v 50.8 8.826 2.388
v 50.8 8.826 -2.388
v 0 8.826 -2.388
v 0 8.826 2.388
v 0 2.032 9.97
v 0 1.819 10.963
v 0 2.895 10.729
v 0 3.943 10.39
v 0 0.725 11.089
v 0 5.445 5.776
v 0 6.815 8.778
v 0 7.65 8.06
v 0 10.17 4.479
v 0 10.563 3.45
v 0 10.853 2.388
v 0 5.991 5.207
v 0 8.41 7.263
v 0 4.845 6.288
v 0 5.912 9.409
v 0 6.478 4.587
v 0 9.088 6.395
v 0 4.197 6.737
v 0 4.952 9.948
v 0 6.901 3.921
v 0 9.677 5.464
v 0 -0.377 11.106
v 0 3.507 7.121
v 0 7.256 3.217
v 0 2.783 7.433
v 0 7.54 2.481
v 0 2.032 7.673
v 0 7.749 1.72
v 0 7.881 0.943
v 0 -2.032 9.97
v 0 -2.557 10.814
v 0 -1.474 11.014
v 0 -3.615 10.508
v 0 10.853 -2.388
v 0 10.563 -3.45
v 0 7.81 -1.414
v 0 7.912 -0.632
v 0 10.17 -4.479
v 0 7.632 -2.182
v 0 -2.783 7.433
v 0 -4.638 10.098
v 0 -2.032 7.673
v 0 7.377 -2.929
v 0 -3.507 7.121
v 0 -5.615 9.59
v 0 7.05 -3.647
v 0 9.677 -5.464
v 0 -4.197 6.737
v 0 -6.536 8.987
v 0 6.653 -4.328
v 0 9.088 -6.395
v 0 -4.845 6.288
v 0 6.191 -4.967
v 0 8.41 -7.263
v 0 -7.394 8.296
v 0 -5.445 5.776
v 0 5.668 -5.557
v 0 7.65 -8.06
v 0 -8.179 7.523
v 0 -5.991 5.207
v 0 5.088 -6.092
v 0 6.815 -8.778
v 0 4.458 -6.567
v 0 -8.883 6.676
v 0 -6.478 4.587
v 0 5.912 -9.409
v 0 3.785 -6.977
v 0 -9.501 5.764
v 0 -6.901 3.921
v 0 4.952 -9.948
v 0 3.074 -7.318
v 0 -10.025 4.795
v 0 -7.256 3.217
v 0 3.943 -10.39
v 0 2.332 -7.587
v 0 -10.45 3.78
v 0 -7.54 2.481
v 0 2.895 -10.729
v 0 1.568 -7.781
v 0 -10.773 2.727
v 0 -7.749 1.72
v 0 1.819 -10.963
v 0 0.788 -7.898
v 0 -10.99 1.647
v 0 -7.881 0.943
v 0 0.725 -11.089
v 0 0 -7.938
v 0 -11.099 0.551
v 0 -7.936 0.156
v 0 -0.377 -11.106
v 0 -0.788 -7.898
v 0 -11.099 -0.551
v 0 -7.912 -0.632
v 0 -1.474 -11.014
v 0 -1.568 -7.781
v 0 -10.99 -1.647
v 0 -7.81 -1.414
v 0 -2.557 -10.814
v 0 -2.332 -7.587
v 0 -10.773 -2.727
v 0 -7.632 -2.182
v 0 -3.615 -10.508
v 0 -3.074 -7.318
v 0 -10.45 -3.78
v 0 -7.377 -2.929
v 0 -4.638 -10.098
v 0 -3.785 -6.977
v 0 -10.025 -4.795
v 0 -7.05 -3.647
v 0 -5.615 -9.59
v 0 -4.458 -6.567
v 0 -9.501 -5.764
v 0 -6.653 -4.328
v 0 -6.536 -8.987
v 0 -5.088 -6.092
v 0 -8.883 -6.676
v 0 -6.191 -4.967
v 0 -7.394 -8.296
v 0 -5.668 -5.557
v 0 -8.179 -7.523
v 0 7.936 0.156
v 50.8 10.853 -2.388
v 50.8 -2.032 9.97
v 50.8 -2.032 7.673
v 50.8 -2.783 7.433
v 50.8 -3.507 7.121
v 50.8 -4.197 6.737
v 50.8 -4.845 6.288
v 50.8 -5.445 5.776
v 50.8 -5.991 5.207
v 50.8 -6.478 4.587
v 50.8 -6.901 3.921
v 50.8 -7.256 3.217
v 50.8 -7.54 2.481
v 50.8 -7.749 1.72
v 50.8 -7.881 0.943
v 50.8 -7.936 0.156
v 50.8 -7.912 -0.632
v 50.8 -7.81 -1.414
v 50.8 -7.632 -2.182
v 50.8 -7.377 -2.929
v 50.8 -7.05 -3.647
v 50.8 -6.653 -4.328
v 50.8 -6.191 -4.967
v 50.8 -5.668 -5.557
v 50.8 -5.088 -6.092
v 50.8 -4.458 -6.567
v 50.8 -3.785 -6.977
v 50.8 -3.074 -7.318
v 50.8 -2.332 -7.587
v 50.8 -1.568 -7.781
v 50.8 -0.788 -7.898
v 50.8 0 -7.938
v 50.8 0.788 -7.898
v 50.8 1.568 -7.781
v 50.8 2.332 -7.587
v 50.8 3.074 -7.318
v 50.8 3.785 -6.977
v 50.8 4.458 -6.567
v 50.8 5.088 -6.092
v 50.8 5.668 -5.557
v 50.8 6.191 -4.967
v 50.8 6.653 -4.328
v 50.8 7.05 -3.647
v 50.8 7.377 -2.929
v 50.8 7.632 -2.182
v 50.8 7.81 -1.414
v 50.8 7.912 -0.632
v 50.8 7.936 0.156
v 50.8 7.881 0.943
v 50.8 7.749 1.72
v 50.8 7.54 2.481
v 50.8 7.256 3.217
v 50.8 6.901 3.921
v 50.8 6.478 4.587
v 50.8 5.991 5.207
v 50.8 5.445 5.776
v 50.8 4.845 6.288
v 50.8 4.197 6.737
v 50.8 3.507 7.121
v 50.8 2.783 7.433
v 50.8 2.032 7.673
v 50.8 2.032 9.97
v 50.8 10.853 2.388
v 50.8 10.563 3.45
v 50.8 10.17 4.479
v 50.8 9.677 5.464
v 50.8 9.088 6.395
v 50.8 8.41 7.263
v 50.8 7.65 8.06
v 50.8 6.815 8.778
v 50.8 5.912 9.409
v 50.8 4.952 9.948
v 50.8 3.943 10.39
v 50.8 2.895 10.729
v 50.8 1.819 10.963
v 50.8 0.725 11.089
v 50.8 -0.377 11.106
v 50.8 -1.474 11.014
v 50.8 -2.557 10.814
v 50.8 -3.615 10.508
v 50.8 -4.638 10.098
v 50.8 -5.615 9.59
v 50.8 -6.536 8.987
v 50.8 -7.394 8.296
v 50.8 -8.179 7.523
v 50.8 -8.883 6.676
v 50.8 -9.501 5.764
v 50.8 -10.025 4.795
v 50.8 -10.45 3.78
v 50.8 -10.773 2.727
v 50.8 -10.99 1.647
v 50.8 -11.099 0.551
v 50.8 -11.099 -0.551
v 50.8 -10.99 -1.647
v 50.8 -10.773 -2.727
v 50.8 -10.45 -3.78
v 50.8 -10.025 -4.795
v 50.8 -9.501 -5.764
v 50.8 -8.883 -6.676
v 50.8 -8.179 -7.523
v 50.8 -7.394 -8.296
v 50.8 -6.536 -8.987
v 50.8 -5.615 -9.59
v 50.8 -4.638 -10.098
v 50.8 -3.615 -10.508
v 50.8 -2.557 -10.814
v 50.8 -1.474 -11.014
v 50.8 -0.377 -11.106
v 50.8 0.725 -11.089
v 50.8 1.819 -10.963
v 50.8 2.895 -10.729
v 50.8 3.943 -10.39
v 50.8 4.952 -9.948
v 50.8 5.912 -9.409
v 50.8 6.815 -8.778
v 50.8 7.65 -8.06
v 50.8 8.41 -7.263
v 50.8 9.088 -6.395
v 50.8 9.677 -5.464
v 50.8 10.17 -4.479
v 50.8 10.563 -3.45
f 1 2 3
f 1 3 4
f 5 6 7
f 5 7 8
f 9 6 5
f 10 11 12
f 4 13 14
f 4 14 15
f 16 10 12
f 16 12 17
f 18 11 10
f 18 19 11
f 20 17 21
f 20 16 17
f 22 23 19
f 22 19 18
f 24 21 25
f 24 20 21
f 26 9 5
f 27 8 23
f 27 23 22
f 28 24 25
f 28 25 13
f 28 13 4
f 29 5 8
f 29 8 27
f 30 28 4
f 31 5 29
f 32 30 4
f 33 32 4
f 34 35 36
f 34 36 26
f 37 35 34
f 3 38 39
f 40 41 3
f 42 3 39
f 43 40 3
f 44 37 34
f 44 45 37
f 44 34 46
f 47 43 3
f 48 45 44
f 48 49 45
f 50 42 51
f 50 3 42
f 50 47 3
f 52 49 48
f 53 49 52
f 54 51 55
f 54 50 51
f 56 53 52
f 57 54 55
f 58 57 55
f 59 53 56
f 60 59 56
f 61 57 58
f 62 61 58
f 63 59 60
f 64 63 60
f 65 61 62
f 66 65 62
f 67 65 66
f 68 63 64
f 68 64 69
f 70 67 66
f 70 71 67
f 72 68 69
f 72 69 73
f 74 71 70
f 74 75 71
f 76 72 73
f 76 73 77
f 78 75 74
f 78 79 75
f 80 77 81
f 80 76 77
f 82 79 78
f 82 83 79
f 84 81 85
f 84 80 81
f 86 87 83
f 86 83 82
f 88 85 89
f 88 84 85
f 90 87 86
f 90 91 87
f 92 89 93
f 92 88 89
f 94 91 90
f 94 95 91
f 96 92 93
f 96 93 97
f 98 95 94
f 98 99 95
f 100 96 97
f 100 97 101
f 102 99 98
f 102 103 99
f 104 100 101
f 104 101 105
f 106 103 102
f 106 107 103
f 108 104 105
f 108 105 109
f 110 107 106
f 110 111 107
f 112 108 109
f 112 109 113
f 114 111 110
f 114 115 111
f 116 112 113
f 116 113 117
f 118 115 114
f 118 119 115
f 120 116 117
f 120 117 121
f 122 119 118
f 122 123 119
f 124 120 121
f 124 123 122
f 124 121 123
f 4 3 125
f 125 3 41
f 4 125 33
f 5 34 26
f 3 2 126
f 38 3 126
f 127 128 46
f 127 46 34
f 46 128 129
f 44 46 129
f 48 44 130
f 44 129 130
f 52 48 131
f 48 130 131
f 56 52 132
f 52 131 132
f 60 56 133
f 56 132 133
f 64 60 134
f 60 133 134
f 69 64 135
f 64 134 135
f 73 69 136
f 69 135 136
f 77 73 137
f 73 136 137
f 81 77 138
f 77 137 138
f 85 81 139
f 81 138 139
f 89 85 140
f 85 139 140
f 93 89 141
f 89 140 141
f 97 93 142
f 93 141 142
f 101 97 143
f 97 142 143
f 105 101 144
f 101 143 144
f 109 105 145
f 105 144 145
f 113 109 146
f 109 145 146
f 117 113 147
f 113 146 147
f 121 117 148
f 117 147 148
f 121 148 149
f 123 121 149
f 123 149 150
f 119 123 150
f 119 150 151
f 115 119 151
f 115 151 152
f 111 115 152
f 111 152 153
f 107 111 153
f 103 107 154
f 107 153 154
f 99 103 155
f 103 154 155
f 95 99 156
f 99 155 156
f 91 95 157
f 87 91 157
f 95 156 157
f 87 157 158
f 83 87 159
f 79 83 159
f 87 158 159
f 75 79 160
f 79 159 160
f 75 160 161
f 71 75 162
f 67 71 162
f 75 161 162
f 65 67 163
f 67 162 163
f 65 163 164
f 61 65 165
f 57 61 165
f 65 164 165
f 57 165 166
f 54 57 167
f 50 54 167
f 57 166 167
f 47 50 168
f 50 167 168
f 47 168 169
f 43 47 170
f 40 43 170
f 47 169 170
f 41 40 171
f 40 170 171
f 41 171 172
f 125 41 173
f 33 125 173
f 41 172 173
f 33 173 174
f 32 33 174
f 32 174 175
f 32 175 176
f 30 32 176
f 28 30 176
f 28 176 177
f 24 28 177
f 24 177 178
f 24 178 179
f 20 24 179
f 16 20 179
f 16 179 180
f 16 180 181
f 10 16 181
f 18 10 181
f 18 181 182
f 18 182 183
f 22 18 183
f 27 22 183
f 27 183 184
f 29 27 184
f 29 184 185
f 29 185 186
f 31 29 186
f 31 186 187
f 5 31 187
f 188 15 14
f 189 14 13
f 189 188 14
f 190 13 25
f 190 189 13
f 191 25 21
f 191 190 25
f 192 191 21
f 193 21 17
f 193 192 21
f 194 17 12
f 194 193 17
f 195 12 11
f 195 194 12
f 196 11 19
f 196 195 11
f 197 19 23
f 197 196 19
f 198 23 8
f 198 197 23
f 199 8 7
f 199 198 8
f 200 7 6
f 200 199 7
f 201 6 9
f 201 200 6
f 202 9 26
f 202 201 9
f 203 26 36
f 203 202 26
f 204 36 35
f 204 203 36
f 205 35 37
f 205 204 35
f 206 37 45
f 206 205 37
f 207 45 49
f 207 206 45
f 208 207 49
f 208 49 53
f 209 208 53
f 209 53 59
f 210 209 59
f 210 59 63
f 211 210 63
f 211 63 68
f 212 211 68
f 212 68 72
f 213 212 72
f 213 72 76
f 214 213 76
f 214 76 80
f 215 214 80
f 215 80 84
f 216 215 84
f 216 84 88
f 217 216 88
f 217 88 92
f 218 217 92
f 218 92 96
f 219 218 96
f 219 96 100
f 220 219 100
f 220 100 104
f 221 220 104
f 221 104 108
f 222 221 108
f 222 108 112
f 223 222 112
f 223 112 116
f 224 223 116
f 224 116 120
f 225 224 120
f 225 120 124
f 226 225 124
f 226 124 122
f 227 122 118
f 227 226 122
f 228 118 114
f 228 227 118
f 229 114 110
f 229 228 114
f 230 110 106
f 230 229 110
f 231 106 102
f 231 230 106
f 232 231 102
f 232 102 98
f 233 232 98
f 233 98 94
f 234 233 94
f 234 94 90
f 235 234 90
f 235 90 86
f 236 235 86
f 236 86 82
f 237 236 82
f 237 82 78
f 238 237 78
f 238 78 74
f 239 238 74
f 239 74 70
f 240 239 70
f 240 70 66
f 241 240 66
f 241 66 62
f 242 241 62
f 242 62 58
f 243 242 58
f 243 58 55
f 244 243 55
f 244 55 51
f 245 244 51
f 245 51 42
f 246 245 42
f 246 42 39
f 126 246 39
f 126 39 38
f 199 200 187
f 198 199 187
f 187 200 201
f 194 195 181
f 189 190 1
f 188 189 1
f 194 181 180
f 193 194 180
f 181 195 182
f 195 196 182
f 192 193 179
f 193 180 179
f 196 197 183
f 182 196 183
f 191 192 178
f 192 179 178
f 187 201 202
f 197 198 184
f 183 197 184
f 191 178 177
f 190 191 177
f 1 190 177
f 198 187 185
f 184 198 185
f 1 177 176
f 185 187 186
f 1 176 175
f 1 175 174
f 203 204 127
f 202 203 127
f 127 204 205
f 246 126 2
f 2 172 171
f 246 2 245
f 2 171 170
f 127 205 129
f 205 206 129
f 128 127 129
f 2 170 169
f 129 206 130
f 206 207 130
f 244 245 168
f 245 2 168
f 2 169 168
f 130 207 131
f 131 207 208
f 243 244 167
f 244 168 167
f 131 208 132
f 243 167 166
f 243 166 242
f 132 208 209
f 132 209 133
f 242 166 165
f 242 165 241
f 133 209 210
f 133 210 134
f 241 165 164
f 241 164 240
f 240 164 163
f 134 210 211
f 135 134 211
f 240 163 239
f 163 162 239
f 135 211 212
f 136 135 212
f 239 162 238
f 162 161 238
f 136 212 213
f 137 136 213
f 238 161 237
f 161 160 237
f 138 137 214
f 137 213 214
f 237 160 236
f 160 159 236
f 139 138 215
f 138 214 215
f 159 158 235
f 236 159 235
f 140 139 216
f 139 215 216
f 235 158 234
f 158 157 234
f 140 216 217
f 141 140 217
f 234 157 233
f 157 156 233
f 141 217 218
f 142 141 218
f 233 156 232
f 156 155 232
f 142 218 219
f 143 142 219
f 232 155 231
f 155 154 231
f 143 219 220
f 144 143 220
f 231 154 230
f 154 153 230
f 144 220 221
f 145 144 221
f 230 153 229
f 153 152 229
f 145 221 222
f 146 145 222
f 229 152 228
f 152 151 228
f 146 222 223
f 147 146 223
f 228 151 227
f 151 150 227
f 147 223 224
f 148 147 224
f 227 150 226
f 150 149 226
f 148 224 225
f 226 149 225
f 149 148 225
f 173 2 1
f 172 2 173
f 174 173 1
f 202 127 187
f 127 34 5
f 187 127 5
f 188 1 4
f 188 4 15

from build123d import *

# Parameters (mm, degrees)
F0_W     = 50.8
F0_H     = 3.175
F2_W     = 4.064
F2_H     = 2.54
F3_DEPTH = 50.801
F4_W     = 2.286
F4_H     = 4.7752
F5_DEPTH = 50.801


with BuildPart() as f1:
    # F0 (on Front) → F1 (revolve)
    with BuildSketch(Plane.XZ):
        with Locations((25.4, 9.525)):
            Rectangle(F0_W, F0_H)
    revolve(axis=Axis((25.403365, 0, 0), (1, 0, 0)))

    # F2 (on face) → F3 (cut, through all)
    with BuildSketch(Plane.YZ.offset(50.8)):
        with Locations((0, 8.6995)):
            Rectangle(F2_W, F2_H)
    extrude(amount=-F3_DEPTH, mode=Mode.SUBTRACT)

    # F4 (on face) → F5 (cut, through all)
    with BuildSketch(Plane.YZ.offset(50.8)):
        with Locations((9.9695, 0)):
            Rectangle(F4_W, F4_H)
    extrude(amount=-F5_DEPTH, mode=Mode.SUBTRACT)


solid = f1.part
